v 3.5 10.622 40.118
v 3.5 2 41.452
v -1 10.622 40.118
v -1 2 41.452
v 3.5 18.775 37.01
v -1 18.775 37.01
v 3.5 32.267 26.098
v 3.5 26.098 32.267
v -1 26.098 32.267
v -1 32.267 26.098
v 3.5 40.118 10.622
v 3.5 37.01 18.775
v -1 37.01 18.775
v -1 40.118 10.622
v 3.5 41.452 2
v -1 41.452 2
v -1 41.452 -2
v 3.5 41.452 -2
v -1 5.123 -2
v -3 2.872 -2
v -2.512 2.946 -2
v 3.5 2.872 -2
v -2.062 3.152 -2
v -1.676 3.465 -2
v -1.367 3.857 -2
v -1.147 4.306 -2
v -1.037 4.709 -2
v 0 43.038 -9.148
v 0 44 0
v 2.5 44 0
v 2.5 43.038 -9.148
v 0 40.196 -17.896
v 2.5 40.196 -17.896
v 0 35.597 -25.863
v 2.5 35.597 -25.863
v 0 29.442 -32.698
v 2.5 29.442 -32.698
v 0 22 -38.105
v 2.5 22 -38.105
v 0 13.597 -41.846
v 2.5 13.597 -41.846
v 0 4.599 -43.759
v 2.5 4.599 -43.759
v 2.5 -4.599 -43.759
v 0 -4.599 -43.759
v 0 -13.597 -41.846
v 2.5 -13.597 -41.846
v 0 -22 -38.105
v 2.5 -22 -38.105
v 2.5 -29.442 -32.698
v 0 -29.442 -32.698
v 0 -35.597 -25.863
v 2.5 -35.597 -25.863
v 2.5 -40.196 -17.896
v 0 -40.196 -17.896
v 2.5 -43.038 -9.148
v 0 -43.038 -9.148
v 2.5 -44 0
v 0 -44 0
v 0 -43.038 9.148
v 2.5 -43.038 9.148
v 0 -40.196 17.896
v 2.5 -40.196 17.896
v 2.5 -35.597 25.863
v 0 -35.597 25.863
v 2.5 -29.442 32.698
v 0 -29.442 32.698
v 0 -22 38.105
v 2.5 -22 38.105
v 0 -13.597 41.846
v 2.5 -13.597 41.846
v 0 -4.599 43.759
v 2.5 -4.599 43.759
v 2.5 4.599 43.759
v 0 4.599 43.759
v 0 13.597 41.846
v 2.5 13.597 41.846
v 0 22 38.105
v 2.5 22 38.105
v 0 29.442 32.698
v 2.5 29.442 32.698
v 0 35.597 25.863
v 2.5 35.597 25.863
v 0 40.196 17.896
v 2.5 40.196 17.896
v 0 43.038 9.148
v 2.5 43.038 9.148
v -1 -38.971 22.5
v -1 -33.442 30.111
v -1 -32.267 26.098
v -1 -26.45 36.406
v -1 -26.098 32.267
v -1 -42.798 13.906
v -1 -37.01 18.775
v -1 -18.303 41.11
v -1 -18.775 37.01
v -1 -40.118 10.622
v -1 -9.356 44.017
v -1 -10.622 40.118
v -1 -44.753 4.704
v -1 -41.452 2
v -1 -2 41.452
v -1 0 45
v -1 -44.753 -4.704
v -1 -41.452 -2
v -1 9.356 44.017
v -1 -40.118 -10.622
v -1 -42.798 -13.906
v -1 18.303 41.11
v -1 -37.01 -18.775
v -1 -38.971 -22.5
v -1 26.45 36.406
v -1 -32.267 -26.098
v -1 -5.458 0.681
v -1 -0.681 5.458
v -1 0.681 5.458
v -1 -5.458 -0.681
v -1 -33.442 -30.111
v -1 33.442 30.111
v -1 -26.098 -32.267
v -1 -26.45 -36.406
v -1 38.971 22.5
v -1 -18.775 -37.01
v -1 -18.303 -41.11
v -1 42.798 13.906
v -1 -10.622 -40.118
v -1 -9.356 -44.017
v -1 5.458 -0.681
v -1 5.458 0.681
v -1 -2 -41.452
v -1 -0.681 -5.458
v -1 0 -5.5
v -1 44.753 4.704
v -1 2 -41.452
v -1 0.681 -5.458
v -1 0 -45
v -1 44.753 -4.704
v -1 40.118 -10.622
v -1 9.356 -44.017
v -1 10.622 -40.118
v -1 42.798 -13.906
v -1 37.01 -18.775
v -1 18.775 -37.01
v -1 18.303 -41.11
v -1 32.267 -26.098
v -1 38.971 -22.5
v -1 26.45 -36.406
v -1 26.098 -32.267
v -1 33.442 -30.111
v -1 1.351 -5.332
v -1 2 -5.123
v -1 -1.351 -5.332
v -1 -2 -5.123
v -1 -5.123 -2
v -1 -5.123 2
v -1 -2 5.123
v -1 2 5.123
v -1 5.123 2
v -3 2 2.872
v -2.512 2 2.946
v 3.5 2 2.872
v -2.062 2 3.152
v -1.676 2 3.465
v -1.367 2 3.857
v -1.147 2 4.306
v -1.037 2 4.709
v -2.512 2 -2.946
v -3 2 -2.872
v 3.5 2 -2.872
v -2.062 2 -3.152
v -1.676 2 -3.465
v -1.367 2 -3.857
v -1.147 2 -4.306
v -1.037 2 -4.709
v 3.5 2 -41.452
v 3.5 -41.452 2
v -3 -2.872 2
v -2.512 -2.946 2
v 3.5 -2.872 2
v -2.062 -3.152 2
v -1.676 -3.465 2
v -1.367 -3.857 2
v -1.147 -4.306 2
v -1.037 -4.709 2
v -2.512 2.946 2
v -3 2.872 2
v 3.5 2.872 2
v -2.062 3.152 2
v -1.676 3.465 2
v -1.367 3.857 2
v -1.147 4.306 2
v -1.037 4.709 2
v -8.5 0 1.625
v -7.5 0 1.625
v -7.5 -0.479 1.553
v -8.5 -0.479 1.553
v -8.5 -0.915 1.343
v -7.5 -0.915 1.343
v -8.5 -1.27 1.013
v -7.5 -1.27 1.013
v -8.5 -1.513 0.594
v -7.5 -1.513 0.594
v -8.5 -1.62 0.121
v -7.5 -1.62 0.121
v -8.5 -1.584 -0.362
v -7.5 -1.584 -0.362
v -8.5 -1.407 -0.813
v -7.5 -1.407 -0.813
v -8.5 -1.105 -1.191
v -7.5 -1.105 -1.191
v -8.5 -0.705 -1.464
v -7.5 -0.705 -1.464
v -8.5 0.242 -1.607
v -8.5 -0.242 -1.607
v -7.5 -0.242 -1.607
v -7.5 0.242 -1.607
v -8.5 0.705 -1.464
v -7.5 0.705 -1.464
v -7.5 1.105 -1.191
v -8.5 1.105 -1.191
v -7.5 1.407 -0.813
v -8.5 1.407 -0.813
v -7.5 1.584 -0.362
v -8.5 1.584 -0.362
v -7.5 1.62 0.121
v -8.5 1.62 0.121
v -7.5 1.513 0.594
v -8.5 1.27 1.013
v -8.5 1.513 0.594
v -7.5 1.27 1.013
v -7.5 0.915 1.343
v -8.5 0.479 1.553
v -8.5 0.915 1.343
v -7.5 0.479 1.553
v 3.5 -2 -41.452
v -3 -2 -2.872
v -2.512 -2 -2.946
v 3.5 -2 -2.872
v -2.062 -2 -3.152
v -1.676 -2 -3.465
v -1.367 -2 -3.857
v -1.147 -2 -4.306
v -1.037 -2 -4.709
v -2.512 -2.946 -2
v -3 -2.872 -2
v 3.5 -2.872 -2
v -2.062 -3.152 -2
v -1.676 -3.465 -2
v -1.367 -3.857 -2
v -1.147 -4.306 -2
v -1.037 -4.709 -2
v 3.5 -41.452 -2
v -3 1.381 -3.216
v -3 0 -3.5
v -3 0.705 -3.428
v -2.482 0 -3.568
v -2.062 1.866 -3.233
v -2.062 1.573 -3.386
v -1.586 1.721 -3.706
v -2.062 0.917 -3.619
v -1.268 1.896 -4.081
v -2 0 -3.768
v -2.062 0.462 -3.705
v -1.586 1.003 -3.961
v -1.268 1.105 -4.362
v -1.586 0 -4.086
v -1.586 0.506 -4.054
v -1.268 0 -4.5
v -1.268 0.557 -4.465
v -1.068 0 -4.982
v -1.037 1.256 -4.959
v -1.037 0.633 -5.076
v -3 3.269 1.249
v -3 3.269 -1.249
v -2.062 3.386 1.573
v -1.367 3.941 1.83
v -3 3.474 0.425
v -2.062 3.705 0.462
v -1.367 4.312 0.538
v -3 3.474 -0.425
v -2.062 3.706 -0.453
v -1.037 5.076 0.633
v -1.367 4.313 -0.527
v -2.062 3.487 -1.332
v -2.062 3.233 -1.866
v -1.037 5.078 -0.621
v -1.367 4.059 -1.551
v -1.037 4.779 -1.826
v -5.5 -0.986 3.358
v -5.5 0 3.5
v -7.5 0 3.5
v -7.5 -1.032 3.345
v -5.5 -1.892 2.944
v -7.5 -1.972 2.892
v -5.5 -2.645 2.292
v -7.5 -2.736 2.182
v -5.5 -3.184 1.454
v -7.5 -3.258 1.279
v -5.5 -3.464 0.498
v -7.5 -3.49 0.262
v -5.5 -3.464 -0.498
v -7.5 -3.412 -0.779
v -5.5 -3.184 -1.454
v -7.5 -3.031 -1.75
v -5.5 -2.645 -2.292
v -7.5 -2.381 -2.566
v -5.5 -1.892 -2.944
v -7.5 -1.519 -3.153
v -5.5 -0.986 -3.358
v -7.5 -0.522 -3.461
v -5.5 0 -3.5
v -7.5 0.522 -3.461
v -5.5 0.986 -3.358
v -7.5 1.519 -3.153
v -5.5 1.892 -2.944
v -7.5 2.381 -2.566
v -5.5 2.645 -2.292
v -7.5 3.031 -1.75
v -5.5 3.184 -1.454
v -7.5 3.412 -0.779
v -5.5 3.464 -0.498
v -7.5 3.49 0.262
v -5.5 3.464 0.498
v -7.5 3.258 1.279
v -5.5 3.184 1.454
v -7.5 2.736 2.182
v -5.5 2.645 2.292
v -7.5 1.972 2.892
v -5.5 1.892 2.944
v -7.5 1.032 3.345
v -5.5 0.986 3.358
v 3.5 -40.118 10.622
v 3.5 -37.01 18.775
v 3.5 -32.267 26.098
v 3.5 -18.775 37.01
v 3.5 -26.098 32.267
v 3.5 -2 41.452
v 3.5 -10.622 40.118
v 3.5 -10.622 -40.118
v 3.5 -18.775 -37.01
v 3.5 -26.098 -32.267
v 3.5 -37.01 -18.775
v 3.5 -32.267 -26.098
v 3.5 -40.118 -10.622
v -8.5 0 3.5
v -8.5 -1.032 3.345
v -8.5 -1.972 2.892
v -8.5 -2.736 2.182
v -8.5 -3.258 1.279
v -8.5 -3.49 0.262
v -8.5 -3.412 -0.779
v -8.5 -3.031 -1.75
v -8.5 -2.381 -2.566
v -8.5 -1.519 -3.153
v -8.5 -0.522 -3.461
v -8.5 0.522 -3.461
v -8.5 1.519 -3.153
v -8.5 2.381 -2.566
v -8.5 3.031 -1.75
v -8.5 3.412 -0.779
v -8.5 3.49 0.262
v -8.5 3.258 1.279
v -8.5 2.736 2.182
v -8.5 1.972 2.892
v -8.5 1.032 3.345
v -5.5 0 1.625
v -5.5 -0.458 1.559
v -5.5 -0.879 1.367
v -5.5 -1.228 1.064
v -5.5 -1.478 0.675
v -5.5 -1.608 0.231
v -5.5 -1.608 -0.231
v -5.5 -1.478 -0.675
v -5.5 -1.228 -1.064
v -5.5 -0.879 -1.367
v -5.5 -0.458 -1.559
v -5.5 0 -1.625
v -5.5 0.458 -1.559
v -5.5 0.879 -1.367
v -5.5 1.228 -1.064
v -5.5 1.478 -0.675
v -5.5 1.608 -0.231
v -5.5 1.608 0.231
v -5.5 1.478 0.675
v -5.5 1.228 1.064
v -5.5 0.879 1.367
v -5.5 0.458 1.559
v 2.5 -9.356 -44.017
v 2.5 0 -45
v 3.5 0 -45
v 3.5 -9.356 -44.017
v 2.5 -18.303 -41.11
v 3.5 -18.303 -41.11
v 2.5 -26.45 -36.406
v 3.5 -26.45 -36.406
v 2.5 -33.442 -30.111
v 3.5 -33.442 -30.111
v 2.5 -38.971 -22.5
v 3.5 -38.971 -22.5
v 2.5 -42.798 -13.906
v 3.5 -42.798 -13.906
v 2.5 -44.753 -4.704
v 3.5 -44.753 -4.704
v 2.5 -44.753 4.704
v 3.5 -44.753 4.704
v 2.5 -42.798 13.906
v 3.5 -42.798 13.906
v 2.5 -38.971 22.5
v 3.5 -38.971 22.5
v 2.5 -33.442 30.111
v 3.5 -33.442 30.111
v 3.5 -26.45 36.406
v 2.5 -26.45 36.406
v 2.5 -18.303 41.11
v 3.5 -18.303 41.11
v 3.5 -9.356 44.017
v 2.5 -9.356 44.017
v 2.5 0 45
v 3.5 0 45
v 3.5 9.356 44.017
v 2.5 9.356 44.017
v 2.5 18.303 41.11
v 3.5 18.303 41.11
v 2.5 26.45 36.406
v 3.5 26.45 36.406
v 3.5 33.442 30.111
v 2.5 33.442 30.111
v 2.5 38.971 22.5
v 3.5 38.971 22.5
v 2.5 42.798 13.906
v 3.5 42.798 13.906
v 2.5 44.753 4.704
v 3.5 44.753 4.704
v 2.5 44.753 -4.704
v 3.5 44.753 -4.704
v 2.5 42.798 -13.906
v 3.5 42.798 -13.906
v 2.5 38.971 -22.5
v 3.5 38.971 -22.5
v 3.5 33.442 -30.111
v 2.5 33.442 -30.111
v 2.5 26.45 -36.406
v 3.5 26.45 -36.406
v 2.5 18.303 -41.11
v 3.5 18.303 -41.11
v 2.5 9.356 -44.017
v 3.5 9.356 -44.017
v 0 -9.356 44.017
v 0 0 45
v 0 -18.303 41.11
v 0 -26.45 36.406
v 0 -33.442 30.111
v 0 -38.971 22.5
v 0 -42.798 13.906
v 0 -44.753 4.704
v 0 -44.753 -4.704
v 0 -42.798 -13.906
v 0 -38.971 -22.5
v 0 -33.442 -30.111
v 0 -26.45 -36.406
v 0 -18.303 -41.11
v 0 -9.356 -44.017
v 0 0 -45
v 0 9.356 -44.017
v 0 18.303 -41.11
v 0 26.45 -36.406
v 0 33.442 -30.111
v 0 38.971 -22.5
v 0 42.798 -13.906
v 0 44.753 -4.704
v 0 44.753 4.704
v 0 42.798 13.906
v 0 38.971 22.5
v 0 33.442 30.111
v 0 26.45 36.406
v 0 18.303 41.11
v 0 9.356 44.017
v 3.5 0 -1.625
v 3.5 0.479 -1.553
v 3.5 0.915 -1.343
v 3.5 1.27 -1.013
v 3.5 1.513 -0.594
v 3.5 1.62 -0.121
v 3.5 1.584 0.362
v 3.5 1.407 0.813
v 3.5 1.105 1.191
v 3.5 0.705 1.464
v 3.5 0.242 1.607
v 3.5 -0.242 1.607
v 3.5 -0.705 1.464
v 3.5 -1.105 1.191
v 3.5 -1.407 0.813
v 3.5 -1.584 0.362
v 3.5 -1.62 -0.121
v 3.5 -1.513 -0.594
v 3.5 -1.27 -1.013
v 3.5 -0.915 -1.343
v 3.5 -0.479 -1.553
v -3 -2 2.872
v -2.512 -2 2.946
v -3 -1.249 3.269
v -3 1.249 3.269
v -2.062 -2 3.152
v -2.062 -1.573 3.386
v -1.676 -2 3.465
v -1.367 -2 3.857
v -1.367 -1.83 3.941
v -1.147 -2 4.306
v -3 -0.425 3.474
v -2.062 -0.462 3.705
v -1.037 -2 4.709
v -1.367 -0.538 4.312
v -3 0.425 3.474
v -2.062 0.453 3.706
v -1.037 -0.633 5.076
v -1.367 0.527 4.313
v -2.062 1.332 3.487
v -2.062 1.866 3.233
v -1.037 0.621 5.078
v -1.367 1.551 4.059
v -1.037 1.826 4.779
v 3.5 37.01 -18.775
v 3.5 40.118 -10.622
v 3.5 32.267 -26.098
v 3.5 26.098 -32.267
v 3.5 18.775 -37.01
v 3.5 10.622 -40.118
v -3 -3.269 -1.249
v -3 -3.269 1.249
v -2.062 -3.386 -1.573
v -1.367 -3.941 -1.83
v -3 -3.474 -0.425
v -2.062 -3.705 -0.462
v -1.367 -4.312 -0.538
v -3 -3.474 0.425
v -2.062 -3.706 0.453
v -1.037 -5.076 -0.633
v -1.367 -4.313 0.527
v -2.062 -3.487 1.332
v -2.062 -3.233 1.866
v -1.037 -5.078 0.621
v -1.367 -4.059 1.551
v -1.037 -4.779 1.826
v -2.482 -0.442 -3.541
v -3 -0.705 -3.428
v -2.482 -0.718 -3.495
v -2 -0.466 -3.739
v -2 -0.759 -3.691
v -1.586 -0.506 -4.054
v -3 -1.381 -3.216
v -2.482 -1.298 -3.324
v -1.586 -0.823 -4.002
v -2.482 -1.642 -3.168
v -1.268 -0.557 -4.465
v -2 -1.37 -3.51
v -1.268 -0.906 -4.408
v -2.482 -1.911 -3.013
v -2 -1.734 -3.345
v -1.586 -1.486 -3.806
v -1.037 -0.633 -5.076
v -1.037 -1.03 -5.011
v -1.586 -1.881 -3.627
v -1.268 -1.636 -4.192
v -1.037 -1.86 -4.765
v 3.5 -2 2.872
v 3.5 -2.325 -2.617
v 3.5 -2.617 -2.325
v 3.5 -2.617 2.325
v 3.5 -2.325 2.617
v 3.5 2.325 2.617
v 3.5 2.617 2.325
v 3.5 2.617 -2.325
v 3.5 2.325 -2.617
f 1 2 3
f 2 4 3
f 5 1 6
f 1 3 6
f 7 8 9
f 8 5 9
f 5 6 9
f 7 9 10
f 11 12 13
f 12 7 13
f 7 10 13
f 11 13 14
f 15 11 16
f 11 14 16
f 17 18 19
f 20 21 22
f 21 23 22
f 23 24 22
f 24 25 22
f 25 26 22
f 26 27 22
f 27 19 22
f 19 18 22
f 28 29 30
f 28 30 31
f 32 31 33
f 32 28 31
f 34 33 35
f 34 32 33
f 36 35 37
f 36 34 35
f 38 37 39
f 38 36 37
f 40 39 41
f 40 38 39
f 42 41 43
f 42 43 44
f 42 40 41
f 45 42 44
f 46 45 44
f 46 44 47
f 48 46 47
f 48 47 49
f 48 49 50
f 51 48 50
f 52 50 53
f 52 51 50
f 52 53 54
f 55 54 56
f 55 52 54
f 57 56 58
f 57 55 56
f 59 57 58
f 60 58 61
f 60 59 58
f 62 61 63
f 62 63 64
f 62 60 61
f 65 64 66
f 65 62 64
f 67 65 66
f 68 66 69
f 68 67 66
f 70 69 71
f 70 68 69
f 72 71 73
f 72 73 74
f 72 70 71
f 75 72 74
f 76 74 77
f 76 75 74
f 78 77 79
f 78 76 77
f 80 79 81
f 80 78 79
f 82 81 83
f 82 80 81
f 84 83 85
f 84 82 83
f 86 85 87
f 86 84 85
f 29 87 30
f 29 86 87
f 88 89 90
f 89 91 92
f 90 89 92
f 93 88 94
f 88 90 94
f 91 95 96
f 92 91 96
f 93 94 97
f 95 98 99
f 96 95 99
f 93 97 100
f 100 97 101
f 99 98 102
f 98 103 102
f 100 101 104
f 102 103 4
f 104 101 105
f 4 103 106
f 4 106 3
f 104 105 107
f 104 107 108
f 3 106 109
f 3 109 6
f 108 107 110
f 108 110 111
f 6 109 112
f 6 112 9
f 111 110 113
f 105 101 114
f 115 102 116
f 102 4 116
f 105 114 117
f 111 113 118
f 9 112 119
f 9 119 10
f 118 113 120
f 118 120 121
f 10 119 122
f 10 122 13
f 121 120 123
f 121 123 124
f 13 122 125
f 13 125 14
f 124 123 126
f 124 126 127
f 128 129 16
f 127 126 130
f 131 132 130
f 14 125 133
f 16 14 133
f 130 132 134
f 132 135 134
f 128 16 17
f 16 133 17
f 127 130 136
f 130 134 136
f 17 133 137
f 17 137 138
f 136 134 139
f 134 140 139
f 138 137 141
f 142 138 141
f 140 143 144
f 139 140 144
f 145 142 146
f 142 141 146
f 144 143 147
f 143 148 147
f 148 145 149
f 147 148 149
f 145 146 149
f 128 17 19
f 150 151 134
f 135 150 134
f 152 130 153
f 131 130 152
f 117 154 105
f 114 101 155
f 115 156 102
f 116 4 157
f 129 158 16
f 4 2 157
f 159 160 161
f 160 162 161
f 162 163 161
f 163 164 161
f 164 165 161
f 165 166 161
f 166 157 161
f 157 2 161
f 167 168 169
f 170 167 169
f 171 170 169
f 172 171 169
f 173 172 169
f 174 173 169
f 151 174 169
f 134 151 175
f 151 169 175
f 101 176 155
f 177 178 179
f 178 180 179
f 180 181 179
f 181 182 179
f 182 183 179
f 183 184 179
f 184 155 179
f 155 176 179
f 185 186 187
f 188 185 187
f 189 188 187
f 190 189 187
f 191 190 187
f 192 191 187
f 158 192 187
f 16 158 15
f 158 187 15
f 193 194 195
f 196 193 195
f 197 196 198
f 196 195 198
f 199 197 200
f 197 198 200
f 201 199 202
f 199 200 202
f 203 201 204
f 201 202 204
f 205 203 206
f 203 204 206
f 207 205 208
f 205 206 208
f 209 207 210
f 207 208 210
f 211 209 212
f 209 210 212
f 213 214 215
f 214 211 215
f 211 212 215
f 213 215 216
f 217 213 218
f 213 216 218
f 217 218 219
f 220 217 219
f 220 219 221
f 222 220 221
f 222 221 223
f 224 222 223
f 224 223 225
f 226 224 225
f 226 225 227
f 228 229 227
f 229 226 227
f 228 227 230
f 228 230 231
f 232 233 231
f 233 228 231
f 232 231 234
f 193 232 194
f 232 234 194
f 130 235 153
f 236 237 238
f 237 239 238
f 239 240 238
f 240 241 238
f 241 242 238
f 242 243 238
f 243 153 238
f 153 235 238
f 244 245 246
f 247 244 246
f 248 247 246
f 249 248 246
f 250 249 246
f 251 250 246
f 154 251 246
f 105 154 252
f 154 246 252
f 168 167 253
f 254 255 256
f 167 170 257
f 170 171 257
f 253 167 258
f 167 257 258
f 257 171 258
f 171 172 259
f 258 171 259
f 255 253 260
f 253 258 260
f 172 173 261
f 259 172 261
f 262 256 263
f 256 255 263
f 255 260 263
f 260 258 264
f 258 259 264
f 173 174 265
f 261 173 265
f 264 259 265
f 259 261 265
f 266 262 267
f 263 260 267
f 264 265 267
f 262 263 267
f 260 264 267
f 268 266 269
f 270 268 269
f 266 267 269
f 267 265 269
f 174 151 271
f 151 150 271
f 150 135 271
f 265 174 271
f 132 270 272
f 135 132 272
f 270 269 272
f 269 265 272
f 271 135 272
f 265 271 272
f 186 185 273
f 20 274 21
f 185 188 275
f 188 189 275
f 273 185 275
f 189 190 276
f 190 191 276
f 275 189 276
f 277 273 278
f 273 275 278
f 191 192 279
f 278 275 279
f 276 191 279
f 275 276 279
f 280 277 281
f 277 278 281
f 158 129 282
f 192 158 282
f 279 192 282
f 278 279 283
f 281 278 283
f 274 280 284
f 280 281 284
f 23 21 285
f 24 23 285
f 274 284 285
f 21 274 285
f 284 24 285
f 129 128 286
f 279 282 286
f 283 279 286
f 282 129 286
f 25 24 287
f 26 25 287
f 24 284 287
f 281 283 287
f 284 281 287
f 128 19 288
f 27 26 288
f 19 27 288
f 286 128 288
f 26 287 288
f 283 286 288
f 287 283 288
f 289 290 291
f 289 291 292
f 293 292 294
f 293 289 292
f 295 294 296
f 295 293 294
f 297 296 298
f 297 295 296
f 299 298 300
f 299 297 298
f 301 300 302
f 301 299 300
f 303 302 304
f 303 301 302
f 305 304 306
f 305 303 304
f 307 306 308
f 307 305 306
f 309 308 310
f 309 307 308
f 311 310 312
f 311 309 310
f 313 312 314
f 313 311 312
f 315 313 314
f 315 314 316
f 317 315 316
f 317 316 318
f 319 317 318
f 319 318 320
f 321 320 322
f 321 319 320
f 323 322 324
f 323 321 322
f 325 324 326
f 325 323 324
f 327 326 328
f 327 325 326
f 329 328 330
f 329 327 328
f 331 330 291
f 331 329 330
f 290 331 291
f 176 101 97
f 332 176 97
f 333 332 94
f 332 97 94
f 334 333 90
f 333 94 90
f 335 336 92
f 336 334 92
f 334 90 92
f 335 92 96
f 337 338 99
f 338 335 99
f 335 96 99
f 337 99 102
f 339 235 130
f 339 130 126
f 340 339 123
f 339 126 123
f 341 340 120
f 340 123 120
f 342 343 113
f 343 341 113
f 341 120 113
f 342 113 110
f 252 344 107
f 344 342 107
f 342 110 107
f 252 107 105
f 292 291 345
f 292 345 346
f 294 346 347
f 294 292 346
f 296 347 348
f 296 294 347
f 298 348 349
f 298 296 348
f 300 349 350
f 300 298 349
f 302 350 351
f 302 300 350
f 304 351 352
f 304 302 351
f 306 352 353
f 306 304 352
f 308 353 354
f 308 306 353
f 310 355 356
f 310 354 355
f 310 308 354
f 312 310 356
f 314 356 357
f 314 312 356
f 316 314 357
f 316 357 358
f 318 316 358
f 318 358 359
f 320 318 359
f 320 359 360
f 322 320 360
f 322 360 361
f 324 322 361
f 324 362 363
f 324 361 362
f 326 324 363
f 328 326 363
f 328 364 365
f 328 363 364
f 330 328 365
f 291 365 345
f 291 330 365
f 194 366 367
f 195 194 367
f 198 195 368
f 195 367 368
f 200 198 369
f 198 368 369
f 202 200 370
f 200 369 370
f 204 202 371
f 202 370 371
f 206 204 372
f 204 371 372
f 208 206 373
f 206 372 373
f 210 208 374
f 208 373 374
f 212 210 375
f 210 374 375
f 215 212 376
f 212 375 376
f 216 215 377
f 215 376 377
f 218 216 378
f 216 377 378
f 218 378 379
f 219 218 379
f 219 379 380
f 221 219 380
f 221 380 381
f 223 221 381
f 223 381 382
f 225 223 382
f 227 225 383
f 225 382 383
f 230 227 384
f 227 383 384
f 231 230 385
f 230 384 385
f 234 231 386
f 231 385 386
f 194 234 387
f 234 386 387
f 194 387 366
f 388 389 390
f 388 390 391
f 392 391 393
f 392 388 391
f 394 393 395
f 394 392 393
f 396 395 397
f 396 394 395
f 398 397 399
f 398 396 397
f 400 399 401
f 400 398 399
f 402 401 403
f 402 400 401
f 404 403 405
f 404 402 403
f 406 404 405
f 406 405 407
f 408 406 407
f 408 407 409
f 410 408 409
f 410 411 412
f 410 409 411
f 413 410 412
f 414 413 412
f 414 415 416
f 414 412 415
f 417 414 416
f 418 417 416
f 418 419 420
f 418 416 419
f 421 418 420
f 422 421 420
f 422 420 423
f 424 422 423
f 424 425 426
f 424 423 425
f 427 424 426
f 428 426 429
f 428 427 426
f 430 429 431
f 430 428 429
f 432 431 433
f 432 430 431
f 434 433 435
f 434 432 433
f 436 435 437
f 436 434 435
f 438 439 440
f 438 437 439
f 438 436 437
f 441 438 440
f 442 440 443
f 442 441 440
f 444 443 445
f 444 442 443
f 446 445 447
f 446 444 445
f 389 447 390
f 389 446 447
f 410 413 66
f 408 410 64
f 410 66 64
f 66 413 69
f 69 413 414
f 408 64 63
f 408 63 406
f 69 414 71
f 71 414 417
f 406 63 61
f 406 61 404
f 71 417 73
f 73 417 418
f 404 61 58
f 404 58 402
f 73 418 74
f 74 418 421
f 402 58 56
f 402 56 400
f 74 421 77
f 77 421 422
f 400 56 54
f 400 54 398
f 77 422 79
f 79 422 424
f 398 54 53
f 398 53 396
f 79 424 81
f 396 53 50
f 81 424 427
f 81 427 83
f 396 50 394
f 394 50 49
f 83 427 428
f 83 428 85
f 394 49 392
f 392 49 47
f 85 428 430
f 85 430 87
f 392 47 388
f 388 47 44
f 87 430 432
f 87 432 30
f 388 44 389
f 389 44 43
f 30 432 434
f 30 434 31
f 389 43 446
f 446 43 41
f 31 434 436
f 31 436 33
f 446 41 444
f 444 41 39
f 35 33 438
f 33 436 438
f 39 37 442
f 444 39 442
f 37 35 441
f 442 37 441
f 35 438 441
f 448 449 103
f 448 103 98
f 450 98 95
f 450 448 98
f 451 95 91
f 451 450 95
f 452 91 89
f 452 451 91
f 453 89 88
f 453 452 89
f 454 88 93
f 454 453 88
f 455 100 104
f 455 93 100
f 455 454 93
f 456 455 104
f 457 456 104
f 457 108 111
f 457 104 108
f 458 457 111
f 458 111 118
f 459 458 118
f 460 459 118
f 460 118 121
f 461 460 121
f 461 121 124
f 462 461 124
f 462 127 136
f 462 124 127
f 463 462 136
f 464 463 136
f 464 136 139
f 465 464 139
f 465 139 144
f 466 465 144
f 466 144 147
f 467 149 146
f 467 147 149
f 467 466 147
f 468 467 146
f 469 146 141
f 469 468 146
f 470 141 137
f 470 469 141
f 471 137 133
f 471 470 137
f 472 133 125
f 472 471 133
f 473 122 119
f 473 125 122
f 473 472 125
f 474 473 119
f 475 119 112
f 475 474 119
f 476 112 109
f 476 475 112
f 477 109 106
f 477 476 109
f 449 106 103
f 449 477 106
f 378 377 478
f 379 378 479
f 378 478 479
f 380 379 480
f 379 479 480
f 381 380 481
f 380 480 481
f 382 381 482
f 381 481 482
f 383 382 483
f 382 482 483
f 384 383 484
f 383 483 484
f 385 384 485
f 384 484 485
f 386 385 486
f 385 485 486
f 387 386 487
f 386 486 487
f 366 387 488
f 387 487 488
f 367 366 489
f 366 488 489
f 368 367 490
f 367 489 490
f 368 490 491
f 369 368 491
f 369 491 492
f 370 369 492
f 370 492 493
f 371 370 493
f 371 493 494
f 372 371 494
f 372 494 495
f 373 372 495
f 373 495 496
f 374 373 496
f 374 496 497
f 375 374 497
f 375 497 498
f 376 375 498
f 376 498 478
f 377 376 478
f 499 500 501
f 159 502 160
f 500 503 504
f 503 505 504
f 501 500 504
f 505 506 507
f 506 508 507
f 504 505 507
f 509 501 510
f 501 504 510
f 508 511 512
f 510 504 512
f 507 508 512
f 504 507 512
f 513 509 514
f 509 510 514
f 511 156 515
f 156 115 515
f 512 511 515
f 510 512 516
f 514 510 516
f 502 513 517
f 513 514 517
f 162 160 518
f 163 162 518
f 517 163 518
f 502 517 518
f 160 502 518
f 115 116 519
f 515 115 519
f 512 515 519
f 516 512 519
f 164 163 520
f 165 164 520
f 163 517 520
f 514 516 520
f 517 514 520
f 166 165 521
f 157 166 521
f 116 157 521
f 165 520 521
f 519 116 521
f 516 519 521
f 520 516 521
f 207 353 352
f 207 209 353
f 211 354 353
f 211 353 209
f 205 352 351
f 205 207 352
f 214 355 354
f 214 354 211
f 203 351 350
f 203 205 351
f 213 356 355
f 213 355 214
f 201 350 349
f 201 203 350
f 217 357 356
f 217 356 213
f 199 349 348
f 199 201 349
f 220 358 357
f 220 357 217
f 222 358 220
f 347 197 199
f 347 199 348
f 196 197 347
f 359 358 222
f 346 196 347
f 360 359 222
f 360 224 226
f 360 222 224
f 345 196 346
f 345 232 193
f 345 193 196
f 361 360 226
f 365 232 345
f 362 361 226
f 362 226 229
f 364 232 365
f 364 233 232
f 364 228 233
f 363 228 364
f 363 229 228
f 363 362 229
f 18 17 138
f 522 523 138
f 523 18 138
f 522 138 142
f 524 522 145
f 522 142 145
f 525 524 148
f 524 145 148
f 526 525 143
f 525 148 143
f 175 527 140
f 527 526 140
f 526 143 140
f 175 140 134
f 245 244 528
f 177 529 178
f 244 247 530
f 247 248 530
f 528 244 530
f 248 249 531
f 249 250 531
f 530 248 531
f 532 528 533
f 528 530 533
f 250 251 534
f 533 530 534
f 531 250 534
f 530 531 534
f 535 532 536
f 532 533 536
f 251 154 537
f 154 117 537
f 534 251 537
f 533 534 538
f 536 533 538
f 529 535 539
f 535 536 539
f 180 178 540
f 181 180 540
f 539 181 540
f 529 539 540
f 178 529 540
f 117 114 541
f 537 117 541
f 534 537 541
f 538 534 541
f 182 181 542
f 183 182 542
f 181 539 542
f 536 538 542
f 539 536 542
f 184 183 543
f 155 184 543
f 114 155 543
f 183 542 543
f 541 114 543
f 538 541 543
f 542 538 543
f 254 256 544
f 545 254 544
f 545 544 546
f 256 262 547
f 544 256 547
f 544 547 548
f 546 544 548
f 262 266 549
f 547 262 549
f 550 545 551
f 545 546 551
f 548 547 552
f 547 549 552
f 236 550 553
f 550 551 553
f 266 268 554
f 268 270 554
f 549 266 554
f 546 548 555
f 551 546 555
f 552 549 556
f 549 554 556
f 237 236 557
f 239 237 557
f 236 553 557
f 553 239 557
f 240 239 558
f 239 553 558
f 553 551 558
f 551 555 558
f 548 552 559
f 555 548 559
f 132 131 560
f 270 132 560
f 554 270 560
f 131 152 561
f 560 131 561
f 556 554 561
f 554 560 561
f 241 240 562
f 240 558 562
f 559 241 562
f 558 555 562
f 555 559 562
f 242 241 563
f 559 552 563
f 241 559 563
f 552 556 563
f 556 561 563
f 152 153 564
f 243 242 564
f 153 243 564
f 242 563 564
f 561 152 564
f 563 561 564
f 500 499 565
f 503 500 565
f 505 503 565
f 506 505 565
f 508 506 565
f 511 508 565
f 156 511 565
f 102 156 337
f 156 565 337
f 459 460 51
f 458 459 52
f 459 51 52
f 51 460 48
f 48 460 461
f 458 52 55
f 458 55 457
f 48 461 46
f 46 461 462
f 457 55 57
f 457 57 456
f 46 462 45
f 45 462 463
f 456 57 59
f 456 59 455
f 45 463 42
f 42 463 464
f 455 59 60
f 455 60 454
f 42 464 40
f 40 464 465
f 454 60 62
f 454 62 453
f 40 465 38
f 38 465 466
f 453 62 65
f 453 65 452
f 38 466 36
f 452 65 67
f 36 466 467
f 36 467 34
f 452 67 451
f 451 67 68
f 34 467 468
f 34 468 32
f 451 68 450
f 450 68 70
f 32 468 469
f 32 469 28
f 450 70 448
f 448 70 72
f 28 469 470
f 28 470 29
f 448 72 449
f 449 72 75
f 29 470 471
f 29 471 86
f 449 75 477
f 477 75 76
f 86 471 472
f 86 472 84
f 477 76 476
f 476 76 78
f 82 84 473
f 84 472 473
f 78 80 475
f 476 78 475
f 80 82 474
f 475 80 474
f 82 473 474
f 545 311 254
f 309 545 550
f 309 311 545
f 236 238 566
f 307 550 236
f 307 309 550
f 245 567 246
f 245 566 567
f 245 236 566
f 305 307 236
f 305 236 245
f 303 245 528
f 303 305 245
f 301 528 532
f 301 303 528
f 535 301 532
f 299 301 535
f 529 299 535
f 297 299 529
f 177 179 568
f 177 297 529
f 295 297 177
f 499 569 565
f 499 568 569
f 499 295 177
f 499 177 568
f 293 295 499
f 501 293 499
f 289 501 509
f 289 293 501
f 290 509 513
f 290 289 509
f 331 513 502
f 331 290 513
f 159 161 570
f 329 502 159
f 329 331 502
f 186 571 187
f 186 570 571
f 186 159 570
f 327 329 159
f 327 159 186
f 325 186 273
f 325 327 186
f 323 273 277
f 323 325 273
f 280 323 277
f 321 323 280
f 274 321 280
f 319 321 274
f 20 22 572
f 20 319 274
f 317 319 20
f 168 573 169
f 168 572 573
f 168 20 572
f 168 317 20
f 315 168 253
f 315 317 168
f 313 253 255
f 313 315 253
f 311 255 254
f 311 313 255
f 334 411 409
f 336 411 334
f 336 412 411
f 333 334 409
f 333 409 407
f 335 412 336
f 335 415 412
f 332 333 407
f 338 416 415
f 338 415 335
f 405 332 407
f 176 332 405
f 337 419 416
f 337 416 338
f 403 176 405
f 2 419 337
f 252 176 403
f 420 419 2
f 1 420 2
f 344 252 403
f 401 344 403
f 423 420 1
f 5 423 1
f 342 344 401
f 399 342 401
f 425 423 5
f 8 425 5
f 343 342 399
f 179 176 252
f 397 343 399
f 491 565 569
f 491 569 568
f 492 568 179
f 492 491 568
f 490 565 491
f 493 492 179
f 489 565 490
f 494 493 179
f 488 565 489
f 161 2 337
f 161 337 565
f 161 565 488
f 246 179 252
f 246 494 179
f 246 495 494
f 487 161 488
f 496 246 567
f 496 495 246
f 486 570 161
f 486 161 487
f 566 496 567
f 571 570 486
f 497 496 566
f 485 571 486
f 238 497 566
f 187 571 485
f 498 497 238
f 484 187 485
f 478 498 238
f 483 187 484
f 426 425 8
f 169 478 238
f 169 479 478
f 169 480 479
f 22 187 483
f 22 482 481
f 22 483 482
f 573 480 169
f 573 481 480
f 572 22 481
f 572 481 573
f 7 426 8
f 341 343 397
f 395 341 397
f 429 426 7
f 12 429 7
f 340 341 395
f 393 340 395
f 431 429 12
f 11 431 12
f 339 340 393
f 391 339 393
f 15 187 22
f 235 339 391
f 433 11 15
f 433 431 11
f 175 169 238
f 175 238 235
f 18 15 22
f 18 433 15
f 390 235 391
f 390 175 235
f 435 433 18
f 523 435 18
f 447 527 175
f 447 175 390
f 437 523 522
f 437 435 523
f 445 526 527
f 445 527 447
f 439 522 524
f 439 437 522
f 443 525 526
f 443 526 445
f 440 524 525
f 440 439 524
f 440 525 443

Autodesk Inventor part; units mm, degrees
ref_plane "YZ Plane" through (0, 0, 0) normal (1, 0, 0) x (0, 1, 0)
ref_plane "XZ Plane" through (0, 0, 0) normal (0, 1, 0) x (-1, 0, 0)
ref_plane "XY Plane" through (0, 0, 0) normal (0, 0, 1) x (1, 0, 0)
sketch "Sketch1" plane through (0, 0, 0) normal (1, 0, 0) x (0, 1, 0)
  circle A0 centre (0, 0) radius 44
  dimension "d0" = 88
extrude "Extrusion1" add sketch "Sketch1" along normal blind 3.5
sketch "Sketch2" plane through (3.5, 0, 0) normal (1, 0, 0) x (0, 0, -1)
  circle A0 centre (0, 0) radius 45
  dimension "d3" = 90
extrude "Extrusion2" add sketch "Sketch2" along normal blind 1
sketch "Sketch3" plane through (0, 0, 0) normal (-1, 0, 0) x (0, 0, 1)
  circle A0 centre (0, 0) radius 45
  dimension "d6" = 90
extrude "Extrusion3" add sketch "Sketch3" along normal blind 1
sketch "Sketch4" plane through (4.5, 0, 0) normal (1, 0, 0) x (0, 0, -1)
  circle A0 centre (0, 0) radius 41.5
  dimension "d9" = 83
extrude "Extrusion4" cut sketch "Sketch4" against normal blind 6
sketch "Sketch5" plane through (4.5, 0, 0) normal (1, 0, 0) x (0, 0, -1)
  circle A0 centre (0, 0) radius 3.5
  dimension "d12" = 7
extrude "Extrusion5" add sketch "Sketch5" against normal blind 10
sketch "Sketch6" plane through (4.5, 0, 0) normal (1, 0, 0) x (0, 0, -1)
  circle A0 centre (0, 0) radius 45
extrude "Extrusion6" cut sketch "Sketch6" against normal blind 2
sketch "Sketch7" plane through (2.5, 0, 0) normal (1, 0, 0) x (0, 0, -1)
  circle A0 centre (0, 0) radius 3.5 projected
  circle A1 centre (0, 0) radius 41.5
  circle A2 centre (0, 0) radius 45
extrude "Extrusion7" add sketch "Sketch7" along normal blind 1 contours A2
sketch "Sketch8" plane through (2.5, 0, 0) normal (1, 0, 0) x (0, 0, -1)
  circle A0 centre (0, 0) radius 3.5
extrude "Extrusion8" add sketch "Sketch8" along normal blind 1
sketch "Sketch9" plane through (3.5, 0, 0) normal (1, 0, 0) x (0, 0, -1)
  circle A0 centre (0, 0) radius 1.625
  dimension "d21" = 3.25
extrude "Extrusion9" cut sketch "Sketch9" against normal blind 10
sketch "Sketch10" plane through (3.5, 0, 0) normal (1, 0, 0) x (0, 0, -1)
  line L0 (2, 2.1756) -> (-2, 2.1756)
  line L1 (-2, 2.1756) -> (-2, 42.8244)
  line L2 (-2, 42.8244) -> (2, 42.8244)
  line L3 (2, 42.8244) -> (2, 2.1756)
  line L4 (2, 2.1756) -> (-2, 42.8244) construction
  line L5 (-2, 2.1756) -> (2, 42.8244) construction
  point P0 (0, 0)
  point P1 (0, 22.5)
  dimension "d24" = 4
extrude "Extrusion10" add sketch "Sketch10" against normal blind 4.5
pattern_circular "Circular Pattern1" count 4 over 360 about axis through (4.5, 0, 0) along (-1, 0, 0) of "Extrusion10"
fillet "Fillet1" radius 2 5 edges at (-1, 0, 3.5) (-1, -3.5, 0) (-1, 3.5, 0) (-1, -1.0481, -3.3394) (-1, 1.0481, -3.3394)
sketch "Sketch11" plane through (-5.5, 0, 0) normal (-1, 0, 0) x (0, 0, 1)
  circle A0 centre (0, 0) radius 1.625
  circle A1 centre (0, 0) radius 3.5
extrude "Extrusion11" add sketch "Sketch11" along normal blind 2
sketch "Sketch12" plane through (-7.5, 0, 0) normal (-1, 0, 0) x (0, 0, 1)
  circle A0 centre (0, 0) radius 1.625
  circle A1 centre (0, 0) radius 3.5
extrude "Extrusion12" add sketch "Sketch12" along normal blind 1
properties part number "mtv_pushingWheel_2-6"
